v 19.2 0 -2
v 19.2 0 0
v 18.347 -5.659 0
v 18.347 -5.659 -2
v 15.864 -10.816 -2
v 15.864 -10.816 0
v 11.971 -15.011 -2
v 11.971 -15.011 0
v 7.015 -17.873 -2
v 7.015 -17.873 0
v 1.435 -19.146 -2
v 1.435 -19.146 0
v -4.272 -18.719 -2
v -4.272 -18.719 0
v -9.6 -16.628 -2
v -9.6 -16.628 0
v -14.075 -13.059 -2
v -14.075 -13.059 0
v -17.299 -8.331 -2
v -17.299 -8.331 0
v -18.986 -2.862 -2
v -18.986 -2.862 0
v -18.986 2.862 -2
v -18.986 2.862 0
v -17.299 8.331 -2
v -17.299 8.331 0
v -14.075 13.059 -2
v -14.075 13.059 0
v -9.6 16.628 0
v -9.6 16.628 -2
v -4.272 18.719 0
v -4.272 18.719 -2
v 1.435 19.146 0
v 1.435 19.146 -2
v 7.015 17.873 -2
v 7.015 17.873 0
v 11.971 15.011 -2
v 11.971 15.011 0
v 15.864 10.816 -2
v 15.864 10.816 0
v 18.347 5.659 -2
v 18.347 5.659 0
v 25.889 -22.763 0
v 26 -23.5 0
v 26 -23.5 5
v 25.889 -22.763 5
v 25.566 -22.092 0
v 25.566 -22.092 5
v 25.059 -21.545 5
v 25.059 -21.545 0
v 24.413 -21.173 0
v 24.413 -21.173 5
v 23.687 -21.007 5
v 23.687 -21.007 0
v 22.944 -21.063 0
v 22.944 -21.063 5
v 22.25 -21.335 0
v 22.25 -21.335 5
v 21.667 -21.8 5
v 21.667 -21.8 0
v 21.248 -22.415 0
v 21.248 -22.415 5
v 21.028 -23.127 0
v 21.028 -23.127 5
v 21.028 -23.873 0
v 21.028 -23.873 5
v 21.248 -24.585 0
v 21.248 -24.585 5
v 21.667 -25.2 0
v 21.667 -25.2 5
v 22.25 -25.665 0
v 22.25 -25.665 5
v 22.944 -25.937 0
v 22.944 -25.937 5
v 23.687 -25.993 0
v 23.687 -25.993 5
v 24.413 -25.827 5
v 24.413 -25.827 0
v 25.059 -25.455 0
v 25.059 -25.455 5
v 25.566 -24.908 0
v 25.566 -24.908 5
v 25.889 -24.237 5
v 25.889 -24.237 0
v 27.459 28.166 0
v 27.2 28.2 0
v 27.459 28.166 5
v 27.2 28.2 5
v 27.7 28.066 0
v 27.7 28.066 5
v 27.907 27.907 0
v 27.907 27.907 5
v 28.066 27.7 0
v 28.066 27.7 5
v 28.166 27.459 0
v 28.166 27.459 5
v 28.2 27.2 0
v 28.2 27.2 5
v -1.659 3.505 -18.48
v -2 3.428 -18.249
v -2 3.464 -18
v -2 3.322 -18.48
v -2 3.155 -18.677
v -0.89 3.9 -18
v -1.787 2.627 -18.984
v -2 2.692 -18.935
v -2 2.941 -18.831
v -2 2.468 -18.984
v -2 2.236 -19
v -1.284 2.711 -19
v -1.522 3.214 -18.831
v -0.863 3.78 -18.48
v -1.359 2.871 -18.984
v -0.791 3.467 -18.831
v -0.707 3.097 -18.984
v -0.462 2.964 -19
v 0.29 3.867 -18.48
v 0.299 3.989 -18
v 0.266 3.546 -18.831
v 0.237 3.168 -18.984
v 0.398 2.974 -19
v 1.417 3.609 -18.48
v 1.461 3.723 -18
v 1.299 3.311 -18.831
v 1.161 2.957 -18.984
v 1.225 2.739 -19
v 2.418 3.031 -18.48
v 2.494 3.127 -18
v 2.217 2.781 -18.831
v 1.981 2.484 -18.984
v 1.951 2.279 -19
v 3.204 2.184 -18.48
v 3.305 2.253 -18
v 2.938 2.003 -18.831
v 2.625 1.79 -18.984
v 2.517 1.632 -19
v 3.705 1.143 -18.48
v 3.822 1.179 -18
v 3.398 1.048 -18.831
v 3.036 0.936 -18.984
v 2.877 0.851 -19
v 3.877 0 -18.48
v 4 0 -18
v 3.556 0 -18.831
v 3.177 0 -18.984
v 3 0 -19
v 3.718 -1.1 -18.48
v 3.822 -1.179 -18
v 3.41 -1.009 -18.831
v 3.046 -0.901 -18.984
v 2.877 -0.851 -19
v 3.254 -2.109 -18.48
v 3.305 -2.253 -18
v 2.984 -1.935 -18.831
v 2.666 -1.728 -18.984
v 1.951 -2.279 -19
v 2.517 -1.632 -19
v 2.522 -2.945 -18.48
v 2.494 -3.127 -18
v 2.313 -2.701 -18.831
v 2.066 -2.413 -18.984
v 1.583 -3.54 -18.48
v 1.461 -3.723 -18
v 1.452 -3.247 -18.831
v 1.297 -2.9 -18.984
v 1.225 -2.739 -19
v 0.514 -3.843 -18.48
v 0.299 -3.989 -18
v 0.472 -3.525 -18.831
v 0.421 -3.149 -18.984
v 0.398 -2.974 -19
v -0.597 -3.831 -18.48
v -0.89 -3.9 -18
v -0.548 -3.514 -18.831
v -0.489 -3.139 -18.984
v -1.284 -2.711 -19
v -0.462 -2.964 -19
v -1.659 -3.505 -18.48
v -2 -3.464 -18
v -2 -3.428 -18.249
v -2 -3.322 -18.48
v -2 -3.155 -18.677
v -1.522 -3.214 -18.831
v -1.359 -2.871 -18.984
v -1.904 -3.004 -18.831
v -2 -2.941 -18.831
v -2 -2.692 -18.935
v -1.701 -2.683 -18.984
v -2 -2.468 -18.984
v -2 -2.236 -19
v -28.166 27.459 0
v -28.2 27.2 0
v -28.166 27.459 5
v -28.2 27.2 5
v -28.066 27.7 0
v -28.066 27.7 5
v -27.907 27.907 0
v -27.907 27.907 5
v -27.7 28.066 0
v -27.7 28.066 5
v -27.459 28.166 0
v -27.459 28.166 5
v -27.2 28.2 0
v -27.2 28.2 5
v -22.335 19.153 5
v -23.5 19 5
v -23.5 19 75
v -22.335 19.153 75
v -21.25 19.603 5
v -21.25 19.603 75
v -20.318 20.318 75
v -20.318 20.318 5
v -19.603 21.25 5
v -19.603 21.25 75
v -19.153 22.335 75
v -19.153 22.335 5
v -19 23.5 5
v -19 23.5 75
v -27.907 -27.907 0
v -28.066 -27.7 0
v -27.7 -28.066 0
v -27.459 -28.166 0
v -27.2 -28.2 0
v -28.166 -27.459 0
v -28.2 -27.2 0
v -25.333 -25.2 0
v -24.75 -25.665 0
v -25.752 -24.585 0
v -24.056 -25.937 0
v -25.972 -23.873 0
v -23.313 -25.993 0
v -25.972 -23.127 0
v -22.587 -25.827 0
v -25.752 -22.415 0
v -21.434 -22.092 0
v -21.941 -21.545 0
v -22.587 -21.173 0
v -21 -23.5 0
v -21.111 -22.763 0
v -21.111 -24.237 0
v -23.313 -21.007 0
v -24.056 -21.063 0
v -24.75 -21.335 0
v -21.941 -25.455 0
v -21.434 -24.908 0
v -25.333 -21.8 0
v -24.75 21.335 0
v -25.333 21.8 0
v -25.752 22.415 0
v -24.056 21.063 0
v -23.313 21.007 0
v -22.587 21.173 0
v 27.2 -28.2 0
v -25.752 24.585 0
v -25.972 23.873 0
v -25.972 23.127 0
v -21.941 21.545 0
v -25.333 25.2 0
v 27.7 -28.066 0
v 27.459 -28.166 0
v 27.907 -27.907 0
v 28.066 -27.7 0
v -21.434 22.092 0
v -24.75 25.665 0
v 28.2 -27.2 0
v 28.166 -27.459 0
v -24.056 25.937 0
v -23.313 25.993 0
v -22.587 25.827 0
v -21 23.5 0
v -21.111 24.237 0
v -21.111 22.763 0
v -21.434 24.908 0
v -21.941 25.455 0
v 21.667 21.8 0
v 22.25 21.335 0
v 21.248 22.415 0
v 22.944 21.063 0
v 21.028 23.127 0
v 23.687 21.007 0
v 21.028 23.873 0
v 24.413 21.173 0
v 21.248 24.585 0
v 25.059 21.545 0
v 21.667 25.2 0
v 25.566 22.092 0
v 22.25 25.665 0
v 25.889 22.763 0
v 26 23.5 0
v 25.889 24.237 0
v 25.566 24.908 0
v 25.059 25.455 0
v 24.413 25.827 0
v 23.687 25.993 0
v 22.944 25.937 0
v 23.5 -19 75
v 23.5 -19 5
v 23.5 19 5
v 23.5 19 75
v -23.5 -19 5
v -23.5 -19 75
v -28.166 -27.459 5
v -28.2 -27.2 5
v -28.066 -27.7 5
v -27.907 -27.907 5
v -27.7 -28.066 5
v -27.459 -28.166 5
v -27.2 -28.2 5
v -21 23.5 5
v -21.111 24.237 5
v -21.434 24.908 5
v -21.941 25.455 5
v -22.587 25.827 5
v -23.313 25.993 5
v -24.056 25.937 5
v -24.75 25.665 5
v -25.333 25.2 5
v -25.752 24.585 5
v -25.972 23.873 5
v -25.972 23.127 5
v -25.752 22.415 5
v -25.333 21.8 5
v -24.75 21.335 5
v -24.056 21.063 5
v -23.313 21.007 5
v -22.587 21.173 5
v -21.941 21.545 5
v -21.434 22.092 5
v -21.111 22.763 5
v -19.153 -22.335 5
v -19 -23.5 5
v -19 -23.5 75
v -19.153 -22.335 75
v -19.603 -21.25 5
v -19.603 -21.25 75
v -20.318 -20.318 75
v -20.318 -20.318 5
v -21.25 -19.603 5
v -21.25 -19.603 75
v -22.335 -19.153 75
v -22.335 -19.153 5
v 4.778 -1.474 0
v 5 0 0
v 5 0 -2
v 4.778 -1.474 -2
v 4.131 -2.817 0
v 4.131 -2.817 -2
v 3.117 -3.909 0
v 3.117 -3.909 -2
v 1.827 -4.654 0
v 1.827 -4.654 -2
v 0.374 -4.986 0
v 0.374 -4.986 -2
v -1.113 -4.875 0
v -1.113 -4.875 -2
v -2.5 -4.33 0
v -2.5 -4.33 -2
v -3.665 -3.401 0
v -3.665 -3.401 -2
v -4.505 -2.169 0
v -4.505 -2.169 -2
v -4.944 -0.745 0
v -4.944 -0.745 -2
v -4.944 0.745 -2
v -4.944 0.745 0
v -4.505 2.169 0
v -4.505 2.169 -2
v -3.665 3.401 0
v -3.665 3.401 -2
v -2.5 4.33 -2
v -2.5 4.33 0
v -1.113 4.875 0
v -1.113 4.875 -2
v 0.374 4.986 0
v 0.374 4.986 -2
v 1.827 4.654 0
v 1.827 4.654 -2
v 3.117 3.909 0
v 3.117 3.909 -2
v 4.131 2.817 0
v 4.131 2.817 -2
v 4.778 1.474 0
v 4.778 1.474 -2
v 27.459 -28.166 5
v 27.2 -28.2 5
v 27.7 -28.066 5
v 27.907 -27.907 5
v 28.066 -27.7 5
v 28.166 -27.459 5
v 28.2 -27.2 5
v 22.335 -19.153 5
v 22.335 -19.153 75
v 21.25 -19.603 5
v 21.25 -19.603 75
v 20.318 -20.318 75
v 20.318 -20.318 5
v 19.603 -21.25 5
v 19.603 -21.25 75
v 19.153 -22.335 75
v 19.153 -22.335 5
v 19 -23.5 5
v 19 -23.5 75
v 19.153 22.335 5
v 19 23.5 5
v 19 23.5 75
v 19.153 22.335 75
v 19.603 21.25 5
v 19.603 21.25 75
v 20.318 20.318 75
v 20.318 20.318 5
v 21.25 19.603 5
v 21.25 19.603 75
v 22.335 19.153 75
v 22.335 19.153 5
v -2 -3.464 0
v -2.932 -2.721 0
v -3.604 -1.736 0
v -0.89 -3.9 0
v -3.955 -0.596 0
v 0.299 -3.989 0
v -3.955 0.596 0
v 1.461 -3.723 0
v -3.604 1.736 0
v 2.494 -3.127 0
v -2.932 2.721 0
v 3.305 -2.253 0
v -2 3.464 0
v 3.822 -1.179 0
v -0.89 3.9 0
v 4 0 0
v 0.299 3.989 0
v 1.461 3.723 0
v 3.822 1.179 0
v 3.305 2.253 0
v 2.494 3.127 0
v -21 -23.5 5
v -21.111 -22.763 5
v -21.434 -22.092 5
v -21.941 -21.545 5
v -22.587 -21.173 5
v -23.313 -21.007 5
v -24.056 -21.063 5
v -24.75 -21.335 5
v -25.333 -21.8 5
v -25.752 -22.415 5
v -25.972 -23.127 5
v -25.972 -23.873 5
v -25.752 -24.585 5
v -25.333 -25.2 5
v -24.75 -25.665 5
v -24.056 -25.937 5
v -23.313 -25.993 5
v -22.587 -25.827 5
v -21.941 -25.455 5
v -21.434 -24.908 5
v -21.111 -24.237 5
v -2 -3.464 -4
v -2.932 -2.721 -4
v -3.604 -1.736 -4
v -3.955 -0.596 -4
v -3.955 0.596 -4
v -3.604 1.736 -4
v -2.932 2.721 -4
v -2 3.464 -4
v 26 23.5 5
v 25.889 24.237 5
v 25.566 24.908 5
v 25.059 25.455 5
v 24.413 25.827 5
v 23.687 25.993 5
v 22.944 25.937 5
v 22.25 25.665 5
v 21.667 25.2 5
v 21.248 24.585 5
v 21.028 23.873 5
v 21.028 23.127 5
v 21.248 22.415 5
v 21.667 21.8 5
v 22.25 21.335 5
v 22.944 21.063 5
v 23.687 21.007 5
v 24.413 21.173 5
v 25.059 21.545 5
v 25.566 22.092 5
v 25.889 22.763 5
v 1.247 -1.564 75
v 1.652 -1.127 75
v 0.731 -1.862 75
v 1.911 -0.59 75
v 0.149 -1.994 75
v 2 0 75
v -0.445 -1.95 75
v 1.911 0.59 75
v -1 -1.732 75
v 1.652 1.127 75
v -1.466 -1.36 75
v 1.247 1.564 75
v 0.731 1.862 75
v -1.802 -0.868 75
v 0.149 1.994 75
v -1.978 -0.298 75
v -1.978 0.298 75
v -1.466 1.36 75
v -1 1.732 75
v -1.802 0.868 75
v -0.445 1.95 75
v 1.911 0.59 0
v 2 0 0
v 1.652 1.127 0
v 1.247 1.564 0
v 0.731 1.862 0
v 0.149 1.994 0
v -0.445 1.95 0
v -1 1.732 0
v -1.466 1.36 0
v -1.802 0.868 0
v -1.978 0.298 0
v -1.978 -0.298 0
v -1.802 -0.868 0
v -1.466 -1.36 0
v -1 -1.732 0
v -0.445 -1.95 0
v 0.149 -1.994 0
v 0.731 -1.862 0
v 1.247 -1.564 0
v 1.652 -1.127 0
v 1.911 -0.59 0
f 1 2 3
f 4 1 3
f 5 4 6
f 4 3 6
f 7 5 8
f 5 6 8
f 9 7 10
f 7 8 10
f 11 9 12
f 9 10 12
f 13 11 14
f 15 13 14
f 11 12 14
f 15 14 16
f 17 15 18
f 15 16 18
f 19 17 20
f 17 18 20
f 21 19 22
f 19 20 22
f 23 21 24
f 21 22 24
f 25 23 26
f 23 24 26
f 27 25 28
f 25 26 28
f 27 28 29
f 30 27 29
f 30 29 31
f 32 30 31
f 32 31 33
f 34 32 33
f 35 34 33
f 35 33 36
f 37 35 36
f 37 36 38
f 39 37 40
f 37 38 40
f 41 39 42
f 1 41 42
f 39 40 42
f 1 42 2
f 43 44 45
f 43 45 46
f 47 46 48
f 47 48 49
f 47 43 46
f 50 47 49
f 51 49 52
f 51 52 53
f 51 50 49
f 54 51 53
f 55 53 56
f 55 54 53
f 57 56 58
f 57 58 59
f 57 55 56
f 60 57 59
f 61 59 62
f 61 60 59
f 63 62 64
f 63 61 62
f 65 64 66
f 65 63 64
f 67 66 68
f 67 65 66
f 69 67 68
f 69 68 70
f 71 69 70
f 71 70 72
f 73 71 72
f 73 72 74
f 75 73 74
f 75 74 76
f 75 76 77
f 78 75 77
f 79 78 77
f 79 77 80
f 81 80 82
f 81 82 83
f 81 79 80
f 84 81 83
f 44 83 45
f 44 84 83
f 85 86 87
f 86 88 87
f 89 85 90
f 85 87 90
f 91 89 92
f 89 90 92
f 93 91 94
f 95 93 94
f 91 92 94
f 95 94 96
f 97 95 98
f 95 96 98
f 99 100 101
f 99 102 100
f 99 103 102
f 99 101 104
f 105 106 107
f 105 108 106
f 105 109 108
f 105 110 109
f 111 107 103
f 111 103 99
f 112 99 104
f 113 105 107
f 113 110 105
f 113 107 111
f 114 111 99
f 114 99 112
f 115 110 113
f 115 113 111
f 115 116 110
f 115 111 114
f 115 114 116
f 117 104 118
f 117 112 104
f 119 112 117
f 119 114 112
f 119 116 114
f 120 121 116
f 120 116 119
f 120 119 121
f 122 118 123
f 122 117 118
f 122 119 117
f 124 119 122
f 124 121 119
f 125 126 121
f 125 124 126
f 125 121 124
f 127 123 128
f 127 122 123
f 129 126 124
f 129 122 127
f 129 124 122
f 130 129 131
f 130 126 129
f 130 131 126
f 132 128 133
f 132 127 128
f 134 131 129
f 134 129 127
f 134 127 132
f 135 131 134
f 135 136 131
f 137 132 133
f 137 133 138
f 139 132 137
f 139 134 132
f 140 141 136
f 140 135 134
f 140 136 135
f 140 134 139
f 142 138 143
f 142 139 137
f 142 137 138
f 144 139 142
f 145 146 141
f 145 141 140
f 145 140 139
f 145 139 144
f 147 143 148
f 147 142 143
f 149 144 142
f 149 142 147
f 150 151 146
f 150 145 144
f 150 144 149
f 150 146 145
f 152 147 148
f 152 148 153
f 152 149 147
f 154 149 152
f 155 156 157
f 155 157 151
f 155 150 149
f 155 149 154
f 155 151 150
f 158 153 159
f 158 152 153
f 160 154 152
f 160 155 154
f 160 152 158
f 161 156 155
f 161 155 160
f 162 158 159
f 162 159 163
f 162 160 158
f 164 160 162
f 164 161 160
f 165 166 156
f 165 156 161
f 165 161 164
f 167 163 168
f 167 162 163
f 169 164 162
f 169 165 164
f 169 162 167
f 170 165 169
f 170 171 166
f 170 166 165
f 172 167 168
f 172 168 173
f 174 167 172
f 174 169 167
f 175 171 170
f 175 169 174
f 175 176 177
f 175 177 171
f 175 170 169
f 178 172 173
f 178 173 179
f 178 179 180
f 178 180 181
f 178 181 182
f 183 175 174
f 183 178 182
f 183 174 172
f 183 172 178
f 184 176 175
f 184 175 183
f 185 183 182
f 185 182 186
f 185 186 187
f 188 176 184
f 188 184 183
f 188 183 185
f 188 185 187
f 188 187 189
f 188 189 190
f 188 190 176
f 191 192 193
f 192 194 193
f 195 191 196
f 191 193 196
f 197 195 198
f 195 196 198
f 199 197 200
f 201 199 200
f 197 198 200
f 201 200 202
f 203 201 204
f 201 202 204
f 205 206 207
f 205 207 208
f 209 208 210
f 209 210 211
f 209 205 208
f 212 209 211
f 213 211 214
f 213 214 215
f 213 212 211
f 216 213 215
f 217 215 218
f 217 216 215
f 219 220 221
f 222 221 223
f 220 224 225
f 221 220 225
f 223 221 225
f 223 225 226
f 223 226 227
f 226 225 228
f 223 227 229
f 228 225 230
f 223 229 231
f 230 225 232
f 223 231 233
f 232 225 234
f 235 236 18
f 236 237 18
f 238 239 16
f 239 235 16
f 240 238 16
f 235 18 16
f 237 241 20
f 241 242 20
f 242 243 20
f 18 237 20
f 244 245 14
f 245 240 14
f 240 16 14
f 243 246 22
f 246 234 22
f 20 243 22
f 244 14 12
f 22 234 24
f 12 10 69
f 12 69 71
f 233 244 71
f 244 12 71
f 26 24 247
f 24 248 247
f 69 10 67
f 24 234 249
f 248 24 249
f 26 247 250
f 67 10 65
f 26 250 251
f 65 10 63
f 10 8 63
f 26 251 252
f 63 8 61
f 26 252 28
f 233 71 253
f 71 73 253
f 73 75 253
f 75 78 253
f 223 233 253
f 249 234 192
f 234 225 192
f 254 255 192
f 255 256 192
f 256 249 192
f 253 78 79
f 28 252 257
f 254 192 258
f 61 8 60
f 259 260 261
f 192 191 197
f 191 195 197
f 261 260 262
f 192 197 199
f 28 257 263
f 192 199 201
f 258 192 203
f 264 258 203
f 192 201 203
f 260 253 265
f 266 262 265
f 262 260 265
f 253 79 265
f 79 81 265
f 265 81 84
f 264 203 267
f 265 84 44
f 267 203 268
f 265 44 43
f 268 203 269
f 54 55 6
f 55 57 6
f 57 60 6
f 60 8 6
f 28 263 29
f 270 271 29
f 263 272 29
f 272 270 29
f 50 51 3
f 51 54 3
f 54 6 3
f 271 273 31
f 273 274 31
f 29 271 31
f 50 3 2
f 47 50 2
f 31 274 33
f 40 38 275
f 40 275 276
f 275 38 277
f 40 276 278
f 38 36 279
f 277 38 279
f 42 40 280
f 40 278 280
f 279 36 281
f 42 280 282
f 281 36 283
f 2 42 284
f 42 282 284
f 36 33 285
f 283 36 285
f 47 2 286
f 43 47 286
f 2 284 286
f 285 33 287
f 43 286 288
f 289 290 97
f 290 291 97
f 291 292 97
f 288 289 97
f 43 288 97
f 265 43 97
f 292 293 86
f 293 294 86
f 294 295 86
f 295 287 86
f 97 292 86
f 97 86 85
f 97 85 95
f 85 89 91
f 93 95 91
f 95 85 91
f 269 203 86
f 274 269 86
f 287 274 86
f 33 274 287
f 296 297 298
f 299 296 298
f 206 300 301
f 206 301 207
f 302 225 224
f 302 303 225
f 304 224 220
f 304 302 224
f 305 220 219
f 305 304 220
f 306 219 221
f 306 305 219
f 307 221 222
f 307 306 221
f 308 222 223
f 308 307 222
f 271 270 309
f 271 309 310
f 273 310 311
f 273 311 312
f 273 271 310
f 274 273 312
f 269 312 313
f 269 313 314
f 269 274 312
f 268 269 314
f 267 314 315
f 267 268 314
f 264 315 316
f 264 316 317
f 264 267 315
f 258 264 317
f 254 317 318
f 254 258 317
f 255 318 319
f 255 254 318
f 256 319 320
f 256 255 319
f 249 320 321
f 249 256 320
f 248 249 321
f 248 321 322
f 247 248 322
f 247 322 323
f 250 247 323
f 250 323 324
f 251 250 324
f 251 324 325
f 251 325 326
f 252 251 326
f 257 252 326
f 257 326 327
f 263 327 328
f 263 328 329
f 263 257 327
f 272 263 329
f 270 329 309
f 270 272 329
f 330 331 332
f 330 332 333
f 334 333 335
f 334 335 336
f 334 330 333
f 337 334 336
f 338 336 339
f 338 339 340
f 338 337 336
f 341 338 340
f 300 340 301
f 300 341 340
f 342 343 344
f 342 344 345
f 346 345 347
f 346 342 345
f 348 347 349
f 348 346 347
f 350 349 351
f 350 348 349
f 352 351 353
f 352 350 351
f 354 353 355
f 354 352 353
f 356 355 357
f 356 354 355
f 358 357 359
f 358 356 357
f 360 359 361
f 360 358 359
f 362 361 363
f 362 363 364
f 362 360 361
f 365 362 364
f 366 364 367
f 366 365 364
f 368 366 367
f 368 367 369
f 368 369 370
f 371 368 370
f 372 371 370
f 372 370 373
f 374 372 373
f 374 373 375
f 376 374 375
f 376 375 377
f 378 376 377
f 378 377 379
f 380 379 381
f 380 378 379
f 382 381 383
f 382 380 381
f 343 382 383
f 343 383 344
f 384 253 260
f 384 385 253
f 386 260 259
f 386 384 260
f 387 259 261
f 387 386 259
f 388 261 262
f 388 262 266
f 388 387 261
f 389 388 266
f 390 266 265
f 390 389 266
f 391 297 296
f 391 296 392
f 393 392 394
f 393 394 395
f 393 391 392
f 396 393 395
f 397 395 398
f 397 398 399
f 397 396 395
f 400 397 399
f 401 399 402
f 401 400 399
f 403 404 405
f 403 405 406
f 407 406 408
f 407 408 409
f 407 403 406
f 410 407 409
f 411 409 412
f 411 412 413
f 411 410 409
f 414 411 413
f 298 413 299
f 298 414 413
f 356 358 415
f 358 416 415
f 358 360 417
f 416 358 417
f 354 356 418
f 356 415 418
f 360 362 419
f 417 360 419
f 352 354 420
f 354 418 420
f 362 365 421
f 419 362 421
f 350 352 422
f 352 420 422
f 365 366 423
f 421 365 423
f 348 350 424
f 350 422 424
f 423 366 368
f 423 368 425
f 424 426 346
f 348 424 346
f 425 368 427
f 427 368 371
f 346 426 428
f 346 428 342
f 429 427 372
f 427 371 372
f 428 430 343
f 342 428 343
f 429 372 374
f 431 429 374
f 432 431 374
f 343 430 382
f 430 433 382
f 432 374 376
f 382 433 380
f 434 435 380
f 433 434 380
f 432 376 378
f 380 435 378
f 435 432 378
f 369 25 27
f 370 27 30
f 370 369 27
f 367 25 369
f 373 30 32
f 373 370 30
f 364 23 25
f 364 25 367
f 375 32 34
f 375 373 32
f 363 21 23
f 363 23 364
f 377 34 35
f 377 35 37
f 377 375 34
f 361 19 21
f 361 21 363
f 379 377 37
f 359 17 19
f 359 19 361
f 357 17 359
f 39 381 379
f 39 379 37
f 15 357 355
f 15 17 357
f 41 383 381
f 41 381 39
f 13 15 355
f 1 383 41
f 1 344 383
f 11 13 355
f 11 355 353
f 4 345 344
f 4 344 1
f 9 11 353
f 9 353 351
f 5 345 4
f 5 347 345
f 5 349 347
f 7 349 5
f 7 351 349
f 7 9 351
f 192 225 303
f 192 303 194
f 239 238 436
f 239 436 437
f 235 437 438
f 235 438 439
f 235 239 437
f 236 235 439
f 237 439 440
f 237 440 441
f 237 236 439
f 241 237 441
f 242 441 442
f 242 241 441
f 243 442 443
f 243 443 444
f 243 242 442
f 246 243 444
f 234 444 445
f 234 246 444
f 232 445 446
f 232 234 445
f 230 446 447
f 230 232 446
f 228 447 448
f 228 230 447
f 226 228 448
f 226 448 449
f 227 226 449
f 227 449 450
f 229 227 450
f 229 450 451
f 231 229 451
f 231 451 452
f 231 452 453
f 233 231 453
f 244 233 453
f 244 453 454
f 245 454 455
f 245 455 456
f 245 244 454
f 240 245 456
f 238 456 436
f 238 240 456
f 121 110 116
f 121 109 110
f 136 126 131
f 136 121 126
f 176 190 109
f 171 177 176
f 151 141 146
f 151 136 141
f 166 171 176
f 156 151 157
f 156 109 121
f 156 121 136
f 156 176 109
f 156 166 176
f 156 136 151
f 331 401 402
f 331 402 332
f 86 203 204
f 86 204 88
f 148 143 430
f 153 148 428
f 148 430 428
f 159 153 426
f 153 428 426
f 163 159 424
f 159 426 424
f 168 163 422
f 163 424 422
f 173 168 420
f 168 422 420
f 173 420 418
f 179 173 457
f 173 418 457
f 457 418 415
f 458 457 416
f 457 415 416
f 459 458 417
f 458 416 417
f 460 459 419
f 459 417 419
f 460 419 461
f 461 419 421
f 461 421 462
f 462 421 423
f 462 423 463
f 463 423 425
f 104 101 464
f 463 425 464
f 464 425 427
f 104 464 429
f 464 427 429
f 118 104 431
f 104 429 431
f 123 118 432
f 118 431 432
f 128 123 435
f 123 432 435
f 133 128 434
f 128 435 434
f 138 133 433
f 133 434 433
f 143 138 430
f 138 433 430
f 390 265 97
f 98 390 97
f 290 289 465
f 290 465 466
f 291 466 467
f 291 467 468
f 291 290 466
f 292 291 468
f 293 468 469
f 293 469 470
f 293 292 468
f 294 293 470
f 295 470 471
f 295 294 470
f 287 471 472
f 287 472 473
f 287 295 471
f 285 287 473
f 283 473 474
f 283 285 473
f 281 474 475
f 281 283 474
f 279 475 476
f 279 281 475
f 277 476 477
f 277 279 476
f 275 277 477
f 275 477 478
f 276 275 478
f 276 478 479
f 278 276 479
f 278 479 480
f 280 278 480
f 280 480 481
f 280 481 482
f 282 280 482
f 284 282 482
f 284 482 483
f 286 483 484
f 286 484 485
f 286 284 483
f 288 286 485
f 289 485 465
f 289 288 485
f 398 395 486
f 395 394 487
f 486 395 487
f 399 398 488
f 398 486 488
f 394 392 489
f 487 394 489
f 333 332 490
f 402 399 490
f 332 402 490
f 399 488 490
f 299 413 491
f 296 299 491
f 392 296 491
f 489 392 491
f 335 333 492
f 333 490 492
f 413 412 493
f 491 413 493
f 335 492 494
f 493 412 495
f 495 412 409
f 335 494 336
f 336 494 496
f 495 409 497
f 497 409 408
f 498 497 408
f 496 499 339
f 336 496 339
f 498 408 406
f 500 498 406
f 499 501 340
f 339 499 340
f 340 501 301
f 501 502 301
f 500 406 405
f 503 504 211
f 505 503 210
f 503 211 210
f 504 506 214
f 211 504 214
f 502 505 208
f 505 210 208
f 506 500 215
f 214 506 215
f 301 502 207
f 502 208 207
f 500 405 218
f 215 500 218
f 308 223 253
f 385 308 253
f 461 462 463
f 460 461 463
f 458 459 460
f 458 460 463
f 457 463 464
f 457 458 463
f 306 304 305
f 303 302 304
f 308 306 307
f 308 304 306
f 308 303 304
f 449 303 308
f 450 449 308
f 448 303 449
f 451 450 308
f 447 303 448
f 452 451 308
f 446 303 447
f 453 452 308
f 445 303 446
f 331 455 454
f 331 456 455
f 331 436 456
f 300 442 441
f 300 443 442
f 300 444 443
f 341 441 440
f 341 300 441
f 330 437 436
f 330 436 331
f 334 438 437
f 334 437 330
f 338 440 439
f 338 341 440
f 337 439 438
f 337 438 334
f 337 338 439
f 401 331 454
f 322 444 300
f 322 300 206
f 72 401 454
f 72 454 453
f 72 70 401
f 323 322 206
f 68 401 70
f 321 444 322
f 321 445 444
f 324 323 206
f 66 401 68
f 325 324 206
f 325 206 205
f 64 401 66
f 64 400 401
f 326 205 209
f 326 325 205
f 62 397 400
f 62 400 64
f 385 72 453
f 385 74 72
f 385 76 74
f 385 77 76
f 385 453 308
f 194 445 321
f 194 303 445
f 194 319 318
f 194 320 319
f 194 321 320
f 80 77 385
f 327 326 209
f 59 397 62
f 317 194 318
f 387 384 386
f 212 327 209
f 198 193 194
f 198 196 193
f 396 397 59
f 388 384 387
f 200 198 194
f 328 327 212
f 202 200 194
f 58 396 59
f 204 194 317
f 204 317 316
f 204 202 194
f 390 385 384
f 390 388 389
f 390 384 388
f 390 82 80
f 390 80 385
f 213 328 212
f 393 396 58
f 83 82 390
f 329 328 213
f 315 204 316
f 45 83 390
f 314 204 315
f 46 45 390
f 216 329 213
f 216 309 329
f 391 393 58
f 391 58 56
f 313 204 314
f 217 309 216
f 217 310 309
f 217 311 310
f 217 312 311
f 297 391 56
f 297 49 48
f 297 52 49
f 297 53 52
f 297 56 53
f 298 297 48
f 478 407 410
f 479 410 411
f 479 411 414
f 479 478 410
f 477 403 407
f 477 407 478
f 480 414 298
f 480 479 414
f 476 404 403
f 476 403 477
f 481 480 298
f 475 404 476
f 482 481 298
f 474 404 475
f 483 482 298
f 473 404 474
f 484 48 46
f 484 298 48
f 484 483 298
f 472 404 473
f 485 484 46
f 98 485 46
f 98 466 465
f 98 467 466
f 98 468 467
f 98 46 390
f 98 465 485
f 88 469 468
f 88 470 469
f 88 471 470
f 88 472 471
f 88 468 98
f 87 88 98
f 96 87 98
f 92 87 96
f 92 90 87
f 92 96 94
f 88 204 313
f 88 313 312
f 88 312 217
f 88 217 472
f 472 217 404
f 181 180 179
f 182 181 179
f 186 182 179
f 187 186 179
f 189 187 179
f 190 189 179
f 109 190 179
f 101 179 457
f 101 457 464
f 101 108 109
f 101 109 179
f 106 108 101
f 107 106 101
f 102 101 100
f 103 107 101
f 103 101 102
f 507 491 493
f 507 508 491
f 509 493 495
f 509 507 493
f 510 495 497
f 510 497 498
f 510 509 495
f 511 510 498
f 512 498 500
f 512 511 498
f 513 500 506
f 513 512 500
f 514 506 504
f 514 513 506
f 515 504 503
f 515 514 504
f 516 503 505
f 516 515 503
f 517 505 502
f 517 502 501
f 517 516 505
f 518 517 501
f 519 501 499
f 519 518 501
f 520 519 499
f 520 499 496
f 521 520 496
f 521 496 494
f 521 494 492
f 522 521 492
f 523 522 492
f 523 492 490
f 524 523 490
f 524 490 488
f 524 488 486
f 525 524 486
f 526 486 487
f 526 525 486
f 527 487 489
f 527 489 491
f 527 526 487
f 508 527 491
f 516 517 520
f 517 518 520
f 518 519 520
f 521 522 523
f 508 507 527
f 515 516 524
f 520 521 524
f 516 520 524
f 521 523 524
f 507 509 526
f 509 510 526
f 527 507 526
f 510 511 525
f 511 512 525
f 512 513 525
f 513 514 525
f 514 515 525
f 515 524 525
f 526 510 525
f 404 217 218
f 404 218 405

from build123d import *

# Parameters (mm, degrees)
SKETCH_W      = 56.4
SKETCH_H      = 56.4
SKETCH_R      = 2.5
SKETCH_R_2    = 2
PAD_DEPTH     = 5
SKETCH001_R   = 2
PAD001_DEPTH  = 70
SKETCH002_R   = 19.2
SKETCH002_R_2 = 5
PAD002_DEPTH  = 2
SKETCH005_R   = 4
PAD003_DEPTH  = 19
POCKET_DEPTH  = 15
FILLET_R      = 1
FILLET001_R   = 1


with BuildPart() as part:
    # Sketch → Pad (new body)
    with BuildSketch(Plane.XY):
        Rectangle(SKETCH_W, SKETCH_H)
        with Locations((-23.5, 23.5)):
            Circle(SKETCH_R, mode=Mode.SUBTRACT)
        with Locations((23.5, 23.5)):
            Circle(SKETCH_R, mode=Mode.SUBTRACT)
        with Locations((-23.5, -23.5)):
            Circle(SKETCH_R, mode=Mode.SUBTRACT)
        with Locations((23.5, -23.5)):
            Circle(SKETCH_R, mode=Mode.SUBTRACT)
        Circle(SKETCH_R_2, mode=Mode.SUBTRACT)
    extrude(amount=PAD_DEPTH)

    # Sketch001 (on Face11 of Pad) → Pad001 (join)
    with BuildSketch(Plane.XY.offset(5)):
        with BuildLine():
            ThreePointArc((-19, -23.5), (-20.318019, -20.318019), (-23.5, -19))
            Line((-23.5, -19), (-23.5, 19))
            ThreePointArc((-23.5, 19), (-20.318019, 20.318019), (-19, 23.5))
            Line((-19, 23.5), (19, 23.5))
            ThreePointArc((19, 23.5), (20.318019, 20.318019), (23.5, 19))
            Line((23.5, -19), (23.5, 19))
            ThreePointArc((23.5, -19), (20.318019, -20.318019), (19, -23.5))
            Line((19, -23.5), (-19, -23.5))
        make_face()
        Circle(SKETCH001_R, mode=Mode.SUBTRACT)
    extrude(amount=PAD001_DEPTH)

    # Sketch002 (on Face4 of Pad001) → Pad002 (join)
    with BuildSketch(Plane(origin=(0, 0, 0), x_dir=(1, 0, 0), z_dir=(0, 0, -1))):
        Circle(SKETCH002_R)
        Circle(SKETCH002_R_2, mode=Mode.SUBTRACT)
    extrude(amount=PAD002_DEPTH)

    # Sketch005 (on Face24 of Pad002) → Pad003 (join)
    with BuildSketch(Plane(origin=(0, 0, 0), x_dir=(1, 0, 0), z_dir=(0, 0, -1))):
        Circle(SKETCH005_R)
    extrude(amount=PAD003_DEPTH)

    # Sketch004 → Pocket (cut)
    with BuildSketch(Plane(origin=(0, 0, -19), x_dir=(1, 0, 0), z_dir=(0, 0, -1))):
        with BuildLine():
            ThreePointArc((-2, 3.464102), (-4, 0), (-2, -3.464102))
            Line((-2, 3.464102), (-2, -3.464102))
        make_face()
    extrude(amount=-POCKET_DEPTH, mode=Mode.SUBTRACT)

    # Fillet
    fillet_edges = [part.edges().sort_by_distance(p)[0] for p in [
        (-28.2, 28.2, 2.5),
        (-28.2, -28.2, 2.5),
        (28.2, 28.2, 2.5),
        (28.2, -28.2, 2.5),
    ]]
    fillet(fillet_edges, radius=FILLET_R)

    # Fillet001
    fillet001_edges = [part.edges().sort_by_distance(p)[0] for p in [
        (2, 3.464102, -19),
    ]]
    fillet(fillet001_edges, radius=FILLET001_R)


solid = part.part
